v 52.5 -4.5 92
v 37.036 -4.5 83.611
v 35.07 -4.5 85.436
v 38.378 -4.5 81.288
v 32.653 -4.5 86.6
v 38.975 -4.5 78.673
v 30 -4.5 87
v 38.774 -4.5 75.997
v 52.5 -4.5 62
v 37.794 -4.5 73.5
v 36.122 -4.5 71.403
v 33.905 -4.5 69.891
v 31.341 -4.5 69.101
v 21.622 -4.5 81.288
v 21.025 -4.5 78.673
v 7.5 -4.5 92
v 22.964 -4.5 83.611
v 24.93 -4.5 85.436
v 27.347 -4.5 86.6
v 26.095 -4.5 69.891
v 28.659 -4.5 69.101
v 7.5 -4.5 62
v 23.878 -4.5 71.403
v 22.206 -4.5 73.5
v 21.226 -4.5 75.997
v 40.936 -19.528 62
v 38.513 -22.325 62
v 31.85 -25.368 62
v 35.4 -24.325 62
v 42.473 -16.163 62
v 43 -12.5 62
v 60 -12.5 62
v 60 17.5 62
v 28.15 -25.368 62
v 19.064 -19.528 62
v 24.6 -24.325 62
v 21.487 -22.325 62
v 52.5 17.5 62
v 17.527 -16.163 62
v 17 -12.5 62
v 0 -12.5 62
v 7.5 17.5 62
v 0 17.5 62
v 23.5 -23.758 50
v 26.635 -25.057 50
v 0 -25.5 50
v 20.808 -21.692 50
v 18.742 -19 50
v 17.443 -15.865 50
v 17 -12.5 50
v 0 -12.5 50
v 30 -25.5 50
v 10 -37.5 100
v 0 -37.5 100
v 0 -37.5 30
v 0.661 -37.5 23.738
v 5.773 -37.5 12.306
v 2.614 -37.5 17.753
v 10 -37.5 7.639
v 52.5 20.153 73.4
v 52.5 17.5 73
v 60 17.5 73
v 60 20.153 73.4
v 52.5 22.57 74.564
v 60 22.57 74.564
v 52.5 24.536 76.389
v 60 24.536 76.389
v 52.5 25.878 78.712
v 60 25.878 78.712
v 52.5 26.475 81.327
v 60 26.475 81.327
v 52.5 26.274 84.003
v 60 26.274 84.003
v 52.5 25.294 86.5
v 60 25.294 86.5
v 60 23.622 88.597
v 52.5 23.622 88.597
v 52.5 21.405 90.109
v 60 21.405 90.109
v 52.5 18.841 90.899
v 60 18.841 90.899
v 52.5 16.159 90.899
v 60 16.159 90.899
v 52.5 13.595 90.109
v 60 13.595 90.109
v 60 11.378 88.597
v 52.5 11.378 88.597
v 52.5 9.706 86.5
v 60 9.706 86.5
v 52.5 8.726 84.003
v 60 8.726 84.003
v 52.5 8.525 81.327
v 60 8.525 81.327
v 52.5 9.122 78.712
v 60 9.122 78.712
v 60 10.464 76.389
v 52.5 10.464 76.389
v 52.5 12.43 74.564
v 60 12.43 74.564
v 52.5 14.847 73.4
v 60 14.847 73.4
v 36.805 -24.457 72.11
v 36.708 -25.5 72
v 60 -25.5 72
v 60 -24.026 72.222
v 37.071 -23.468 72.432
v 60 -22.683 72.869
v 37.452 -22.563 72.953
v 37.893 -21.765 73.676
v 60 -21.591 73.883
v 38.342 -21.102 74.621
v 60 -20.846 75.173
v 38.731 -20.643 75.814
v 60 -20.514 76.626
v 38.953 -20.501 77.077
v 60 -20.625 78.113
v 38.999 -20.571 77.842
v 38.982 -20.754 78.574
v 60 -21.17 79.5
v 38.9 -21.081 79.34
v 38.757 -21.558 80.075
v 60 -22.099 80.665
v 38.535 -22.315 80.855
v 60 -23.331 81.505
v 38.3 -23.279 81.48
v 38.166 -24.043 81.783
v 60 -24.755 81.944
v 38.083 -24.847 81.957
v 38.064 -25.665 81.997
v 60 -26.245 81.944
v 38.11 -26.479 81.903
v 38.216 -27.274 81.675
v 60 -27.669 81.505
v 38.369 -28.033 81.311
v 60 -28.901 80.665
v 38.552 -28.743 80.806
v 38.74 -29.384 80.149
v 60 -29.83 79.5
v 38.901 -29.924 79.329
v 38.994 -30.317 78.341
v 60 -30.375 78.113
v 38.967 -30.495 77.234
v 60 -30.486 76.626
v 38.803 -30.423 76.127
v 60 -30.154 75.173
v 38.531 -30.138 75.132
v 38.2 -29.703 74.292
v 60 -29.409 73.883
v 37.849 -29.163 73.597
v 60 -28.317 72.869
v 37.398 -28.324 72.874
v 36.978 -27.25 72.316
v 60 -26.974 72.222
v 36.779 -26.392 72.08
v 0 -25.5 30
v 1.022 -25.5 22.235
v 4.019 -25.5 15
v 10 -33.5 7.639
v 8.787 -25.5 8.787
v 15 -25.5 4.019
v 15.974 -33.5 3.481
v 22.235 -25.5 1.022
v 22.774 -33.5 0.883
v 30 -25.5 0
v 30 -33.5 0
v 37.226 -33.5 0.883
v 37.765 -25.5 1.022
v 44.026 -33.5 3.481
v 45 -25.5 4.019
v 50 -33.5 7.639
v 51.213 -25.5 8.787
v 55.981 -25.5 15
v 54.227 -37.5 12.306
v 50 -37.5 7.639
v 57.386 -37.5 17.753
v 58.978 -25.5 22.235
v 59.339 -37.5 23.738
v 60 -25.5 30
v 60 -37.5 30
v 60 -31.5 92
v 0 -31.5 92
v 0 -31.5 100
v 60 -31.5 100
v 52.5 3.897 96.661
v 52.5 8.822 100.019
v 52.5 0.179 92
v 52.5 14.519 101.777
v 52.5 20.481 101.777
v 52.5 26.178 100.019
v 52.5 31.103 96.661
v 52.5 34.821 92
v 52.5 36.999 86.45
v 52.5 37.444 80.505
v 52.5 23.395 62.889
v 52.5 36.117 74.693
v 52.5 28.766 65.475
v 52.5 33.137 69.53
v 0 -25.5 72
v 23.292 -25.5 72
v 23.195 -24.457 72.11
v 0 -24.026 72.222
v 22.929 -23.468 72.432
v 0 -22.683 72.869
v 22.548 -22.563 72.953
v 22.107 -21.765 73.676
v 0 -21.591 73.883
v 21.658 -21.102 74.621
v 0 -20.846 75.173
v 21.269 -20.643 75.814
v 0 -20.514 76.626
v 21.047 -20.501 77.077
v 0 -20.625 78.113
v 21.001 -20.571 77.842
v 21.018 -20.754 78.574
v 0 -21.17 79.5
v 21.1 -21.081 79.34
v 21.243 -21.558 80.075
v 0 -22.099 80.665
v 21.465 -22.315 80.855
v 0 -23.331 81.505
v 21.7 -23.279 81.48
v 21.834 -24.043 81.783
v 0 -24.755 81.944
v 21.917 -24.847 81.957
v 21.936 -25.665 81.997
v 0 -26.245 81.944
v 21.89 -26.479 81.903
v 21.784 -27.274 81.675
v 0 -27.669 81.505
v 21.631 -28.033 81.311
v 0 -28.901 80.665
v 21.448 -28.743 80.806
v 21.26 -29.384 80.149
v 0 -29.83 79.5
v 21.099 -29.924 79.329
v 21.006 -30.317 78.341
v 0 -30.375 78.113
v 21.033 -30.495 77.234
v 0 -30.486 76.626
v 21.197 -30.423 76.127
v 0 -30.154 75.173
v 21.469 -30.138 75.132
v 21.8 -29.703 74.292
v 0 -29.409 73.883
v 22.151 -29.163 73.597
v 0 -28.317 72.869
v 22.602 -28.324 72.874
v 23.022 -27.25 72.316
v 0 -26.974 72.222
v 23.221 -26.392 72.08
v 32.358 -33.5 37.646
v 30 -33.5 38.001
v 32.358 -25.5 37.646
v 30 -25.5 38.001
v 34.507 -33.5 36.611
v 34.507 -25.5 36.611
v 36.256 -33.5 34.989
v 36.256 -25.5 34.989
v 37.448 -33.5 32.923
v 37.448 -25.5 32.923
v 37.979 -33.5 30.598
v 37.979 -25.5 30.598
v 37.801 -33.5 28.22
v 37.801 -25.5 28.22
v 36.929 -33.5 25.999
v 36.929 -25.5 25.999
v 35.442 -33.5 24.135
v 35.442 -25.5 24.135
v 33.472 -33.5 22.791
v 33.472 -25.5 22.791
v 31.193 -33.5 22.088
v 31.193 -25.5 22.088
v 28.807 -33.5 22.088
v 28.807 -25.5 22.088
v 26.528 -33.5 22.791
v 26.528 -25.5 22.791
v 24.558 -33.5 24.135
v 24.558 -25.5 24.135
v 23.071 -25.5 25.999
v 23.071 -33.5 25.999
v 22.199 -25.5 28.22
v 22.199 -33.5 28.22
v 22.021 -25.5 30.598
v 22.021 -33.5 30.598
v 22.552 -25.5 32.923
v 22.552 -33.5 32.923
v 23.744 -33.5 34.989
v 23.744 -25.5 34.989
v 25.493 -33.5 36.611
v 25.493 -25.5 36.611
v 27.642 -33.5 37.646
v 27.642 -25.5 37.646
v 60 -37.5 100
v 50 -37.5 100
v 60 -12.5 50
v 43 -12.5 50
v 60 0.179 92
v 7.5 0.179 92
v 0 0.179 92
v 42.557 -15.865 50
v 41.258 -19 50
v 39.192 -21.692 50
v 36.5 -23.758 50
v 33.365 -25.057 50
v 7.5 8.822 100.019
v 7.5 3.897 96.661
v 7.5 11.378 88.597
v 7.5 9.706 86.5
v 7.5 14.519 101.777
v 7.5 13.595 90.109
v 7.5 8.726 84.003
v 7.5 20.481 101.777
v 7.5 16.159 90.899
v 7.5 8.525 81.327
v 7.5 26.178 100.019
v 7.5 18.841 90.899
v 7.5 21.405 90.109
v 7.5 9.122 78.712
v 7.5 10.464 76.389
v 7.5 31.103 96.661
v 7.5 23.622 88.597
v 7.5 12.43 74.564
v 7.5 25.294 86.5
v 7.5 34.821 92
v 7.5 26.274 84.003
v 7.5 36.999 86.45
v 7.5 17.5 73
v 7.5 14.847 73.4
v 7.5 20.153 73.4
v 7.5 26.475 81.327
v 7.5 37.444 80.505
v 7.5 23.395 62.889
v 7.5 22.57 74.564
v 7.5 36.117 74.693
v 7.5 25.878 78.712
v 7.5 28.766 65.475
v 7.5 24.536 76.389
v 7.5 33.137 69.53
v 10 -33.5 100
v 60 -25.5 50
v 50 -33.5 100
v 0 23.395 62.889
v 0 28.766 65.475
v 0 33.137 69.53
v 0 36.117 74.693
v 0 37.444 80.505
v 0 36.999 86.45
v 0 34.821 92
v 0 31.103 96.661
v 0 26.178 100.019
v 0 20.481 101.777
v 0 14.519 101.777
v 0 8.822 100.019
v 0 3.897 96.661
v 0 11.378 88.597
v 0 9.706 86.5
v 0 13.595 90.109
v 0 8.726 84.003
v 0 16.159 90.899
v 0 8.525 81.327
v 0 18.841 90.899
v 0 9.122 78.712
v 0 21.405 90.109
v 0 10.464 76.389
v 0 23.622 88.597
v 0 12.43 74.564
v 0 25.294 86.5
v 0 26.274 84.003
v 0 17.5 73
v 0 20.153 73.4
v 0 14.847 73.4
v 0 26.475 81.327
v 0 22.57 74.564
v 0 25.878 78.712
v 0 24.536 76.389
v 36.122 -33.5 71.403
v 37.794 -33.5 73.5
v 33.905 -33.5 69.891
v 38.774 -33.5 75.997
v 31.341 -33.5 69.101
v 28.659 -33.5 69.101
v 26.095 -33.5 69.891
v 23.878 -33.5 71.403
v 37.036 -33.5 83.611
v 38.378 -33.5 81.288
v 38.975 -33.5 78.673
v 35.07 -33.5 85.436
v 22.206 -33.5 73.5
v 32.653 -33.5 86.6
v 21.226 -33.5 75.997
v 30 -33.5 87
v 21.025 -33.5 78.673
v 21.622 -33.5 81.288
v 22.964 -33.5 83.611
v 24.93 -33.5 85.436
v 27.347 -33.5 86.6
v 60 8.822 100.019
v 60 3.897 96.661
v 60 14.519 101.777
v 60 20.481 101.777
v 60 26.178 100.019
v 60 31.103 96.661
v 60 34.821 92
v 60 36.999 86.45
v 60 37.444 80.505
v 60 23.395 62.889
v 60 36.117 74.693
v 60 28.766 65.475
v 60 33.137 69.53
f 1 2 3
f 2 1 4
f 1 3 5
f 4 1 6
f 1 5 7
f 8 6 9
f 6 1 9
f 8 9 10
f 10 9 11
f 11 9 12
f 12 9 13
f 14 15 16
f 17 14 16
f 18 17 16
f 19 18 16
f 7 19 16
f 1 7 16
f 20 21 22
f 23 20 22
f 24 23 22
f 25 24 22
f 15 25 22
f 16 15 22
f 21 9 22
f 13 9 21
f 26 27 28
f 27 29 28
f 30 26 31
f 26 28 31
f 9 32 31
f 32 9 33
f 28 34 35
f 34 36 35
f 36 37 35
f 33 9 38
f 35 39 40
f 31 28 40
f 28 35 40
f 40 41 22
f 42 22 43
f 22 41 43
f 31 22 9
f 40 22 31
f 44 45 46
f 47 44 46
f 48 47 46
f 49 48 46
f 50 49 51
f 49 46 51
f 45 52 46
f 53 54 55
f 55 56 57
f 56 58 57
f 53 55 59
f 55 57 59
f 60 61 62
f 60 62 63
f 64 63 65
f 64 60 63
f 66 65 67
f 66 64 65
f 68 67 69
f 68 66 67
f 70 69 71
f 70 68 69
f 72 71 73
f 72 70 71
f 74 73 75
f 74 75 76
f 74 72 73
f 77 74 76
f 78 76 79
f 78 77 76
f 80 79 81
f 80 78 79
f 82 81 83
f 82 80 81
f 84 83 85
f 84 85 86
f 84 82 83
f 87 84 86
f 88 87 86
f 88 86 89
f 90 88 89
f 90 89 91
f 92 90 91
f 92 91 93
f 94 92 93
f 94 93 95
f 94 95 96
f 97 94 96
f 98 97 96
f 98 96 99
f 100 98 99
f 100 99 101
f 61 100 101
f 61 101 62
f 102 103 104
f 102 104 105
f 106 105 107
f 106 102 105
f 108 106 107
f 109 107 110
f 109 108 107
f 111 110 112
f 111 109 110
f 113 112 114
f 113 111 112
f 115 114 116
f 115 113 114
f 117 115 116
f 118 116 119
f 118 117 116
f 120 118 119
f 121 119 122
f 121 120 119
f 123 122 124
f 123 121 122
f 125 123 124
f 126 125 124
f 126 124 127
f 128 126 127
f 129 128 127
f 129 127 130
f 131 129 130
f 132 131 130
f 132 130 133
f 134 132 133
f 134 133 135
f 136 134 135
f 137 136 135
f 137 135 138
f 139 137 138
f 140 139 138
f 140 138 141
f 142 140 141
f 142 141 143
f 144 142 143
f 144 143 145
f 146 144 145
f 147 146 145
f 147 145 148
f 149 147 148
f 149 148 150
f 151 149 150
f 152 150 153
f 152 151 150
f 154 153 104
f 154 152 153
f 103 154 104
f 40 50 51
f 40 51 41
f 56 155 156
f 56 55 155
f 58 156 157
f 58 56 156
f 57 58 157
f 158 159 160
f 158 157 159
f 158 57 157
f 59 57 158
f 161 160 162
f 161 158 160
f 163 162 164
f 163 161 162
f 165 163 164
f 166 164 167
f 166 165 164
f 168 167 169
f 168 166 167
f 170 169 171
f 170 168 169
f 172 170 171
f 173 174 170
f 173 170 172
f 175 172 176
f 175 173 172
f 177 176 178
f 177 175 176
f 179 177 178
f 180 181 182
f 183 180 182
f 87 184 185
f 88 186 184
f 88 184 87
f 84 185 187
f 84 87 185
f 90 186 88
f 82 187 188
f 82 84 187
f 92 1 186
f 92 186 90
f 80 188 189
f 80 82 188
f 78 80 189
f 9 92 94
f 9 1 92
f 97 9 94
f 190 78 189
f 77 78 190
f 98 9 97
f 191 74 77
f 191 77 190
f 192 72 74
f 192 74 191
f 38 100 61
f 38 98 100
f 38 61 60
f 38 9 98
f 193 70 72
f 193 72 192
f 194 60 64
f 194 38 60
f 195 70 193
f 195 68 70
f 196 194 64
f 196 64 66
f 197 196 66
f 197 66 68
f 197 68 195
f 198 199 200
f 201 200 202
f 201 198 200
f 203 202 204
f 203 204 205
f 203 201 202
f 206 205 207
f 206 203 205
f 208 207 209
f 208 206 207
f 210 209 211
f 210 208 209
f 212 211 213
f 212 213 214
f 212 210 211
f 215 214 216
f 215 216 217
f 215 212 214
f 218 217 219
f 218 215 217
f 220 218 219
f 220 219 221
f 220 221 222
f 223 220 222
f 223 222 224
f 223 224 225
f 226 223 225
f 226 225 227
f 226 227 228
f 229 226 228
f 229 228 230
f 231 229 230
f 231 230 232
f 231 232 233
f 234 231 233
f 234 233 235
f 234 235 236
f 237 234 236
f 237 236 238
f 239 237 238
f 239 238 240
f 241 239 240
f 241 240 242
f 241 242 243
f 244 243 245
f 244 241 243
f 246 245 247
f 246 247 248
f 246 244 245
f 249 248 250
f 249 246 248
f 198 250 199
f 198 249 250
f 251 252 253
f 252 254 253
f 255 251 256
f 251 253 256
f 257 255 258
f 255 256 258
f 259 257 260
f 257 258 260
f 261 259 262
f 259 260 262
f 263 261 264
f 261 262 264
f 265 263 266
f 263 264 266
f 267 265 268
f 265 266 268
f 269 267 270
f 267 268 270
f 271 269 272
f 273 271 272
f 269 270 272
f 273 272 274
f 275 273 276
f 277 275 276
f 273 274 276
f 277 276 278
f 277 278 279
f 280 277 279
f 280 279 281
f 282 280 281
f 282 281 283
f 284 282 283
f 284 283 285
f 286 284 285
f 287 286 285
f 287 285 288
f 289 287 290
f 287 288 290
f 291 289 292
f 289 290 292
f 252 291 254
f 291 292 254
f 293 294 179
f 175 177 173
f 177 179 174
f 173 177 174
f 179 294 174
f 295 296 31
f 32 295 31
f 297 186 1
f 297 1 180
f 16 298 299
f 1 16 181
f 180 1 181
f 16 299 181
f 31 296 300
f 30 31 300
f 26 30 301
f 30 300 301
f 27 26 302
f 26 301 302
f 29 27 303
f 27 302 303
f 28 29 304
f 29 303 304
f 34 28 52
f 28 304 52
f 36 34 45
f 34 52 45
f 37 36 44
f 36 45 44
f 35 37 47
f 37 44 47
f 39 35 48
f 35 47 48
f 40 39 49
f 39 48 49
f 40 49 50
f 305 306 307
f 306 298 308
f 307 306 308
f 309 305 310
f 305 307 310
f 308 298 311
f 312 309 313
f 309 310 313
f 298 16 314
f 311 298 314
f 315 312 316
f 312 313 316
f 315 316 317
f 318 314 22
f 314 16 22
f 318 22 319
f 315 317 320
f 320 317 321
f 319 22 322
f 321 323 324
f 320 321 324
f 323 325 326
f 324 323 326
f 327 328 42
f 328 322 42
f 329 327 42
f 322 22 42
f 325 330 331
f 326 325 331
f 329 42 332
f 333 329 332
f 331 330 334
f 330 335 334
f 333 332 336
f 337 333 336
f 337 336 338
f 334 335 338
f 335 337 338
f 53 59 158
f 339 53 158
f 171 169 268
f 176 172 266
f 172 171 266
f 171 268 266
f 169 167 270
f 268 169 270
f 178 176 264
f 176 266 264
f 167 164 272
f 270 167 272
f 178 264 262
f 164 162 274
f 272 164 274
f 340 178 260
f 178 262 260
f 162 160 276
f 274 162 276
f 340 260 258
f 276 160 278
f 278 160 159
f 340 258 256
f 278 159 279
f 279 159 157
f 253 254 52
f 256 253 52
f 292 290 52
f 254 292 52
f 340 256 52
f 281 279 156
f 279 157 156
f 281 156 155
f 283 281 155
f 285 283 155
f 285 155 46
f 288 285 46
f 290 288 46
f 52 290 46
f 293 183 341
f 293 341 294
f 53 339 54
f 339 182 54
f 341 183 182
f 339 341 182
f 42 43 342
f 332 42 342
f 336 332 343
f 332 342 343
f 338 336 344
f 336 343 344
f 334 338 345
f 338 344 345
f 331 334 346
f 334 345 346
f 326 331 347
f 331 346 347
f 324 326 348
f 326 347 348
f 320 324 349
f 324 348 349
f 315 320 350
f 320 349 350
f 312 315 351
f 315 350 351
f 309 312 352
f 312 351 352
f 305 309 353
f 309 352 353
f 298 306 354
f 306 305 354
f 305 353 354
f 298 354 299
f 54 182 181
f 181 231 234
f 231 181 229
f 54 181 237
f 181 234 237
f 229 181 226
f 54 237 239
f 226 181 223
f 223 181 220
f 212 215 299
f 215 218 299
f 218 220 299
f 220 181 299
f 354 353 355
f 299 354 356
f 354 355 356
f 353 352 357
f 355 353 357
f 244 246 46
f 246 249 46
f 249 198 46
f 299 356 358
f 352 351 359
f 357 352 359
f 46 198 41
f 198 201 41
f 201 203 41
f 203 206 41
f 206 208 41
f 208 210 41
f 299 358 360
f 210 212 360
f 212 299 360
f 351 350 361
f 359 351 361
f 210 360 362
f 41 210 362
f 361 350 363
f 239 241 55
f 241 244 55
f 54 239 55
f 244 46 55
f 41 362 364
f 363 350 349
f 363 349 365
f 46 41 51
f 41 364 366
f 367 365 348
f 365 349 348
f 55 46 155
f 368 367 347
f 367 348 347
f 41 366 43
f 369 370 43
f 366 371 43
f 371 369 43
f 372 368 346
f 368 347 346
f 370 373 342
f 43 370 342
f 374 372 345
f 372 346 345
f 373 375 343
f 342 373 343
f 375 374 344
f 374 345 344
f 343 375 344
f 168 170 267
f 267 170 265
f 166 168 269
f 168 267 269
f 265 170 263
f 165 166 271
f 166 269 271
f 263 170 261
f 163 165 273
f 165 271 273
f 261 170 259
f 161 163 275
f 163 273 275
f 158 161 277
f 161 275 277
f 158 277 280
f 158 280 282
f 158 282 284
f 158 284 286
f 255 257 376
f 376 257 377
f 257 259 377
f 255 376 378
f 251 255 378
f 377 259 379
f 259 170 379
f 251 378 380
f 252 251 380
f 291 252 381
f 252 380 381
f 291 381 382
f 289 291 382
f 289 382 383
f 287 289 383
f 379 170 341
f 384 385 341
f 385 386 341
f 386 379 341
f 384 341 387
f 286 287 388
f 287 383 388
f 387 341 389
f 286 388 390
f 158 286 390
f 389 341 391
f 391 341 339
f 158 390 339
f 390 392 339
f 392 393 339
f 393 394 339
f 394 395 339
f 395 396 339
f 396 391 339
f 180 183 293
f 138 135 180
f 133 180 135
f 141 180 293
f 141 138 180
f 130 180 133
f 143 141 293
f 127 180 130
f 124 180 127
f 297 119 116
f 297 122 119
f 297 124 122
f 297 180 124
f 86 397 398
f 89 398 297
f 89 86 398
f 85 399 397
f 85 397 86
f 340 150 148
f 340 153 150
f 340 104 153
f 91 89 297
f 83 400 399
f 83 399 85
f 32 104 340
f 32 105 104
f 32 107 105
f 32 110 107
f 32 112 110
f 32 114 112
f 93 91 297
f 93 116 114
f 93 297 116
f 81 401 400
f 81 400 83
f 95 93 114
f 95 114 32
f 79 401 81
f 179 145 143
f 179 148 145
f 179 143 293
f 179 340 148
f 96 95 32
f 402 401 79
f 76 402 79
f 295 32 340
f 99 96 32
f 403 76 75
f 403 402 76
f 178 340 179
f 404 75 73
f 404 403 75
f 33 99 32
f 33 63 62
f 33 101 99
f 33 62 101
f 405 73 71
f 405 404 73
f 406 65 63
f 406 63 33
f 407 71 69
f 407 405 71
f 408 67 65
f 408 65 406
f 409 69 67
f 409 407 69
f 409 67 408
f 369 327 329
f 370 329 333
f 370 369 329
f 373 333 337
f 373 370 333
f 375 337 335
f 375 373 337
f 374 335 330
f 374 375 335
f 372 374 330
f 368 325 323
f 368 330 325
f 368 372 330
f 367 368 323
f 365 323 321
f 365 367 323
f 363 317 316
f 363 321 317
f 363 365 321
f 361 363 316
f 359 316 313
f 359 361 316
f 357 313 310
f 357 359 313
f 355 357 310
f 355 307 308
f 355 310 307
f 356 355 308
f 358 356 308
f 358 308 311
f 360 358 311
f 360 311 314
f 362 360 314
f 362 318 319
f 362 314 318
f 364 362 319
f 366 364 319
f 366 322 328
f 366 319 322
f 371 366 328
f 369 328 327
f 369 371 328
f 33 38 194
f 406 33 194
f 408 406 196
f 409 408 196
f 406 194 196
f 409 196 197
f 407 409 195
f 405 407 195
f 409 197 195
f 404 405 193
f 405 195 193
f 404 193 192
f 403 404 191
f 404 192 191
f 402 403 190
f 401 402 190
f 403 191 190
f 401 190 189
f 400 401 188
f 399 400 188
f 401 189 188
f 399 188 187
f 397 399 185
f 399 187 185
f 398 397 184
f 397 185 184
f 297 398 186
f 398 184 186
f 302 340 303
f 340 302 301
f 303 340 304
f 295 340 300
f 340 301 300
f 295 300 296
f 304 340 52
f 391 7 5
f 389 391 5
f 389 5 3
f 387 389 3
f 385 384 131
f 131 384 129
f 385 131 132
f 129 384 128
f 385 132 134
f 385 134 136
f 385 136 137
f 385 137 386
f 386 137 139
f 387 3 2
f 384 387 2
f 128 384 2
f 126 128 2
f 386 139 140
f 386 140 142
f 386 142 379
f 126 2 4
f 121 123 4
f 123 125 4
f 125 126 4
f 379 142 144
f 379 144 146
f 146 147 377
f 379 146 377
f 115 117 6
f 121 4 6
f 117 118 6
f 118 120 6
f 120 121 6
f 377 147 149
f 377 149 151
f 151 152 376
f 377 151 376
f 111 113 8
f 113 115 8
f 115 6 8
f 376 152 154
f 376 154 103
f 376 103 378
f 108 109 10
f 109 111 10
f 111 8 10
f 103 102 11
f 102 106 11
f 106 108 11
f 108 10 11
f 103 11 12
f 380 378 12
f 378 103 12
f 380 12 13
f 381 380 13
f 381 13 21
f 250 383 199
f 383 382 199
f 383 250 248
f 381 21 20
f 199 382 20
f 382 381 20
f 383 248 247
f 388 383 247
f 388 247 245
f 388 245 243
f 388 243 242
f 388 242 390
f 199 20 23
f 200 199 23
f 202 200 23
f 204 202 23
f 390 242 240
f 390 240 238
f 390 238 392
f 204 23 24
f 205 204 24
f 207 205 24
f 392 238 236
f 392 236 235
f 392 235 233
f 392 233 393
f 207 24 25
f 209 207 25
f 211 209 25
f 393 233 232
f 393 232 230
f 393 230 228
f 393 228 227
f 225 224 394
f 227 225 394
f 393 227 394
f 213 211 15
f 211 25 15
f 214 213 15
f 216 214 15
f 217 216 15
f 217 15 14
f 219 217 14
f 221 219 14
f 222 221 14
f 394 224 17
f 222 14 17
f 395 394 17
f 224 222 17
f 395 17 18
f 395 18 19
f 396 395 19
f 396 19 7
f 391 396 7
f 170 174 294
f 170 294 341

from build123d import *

# Parameters (mm, degrees)
ESQUISSE2_R             = 9
ESQUISSE2_R_2           = 5
BOSS_EXTRU_1_DEPTH      = 60
ESQUISSE3_W             = 40
ESQUISSE3_H             = 4
ESQUISSE3_W_2           = 45
ESQUISSE3_H_2           = 42
ENL_V_MAT_EXTRU_1_DEPTH = 85
CONG_1_RADIUS           = 30
CONG_1_LENGTH           = 12
ESQUISSE4_R             = 9
ESQUISSE4_R_2           = 8.001463265
ENL_V_MAT_EXTRU_2_DEPTH = 85
ESQUISSE5_R             = 13
ENL_V_MAT_EXTRU_3_DEPTH = 12


with BuildPart() as part:
    # Esquisse2 → Boss.-Extru.1 (new body)
    with BuildSketch(Plane(origin=(0, 0, 0), x_dir=(0, 0, -1), z_dir=(1, 0, 0))):
        with BuildLine():
            Line((0, -25.5), (-50, -25.5))
            Line((-50, -25.5), (-50, -12.5))
            Line((-50, -12.5), (-62, -12.5))
            Line((-62, -12.5), (-62, 17.5))
            ThreePointArc((-62, 17.5), (-92, 34.820508076), (-92, 0.179491924))
            Line((-92, 0.179491924), (-92, -31.5))
            Line((-92, -31.5), (-100, -31.5))
            Line((-100, -31.5), (-100, -37.5))
            Line((-100, -37.5), (0, -37.5))
            Line((0, -37.5), (0, -25.5))
        make_face()
        with Locations((-82, 17.5)):
            Circle(ESQUISSE2_R, mode=Mode.SUBTRACT)
        with Locations((-77, -25.5)):
            Circle(ESQUISSE2_R_2, mode=Mode.SUBTRACT)
    extrude(amount=BOSS_EXTRU_1_DEPTH)

    # Esquisse3 → Enlèv. mat.-Extru.1 (cut, symmetric)
    with BuildSketch(Plane(origin=(0, 0, 62), x_dir=(-1, 0, 0), z_dir=(0, 0, -1))):
        with Locations((-30, -35.5)):
            Rectangle(ESQUISSE3_W, ESQUISSE3_H)
        with Locations((-30, 16.5)):
            Rectangle(ESQUISSE3_W_2, ESQUISSE3_H_2)
    extrude(amount=ENL_V_MAT_EXTRU_1_DEPTH, both=True, mode=Mode.SUBTRACT)

    # Congé1: full round fillet: the end face becomes a half cylinder, R = half its width
    cong_1_face = Plane((30, -31.5, 0), x_dir=(0, -1, 0), z_dir=(0, 0, -1))  # on the end face: x along it, z out of the body
    cong_1_slab = cong_1_face.offset(-CONG_1_RADIUS / 2) * Box(CONG_1_LENGTH, 2 * CONG_1_RADIUS, CONG_1_RADIUS, mode=Mode.PRIVATE)  # the body's end, R deep
    cong_1_round = Plane((30, -31.5, 30), x_dir=(0, 0, -1), z_dir=(0, -1, 0)) * Cylinder(CONG_1_RADIUS, CONG_1_LENGTH, mode=Mode.PRIVATE)  # its axis R under the face
    add(cong_1_slab - cong_1_round, mode=Mode.SUBTRACT)

    # Esquisse4 → Enlèv. mat.-Extru.2 (cut, symmetric)
    with BuildSketch(Plane(origin=(0, -4.5, 0), x_dir=(1, 0, 0), z_dir=(0, 1, 0))):
        with Locations(Location((30, -78, 0), (0, 0, 270))):
            Circle(ESQUISSE4_R)
        with Locations(Location((30, -30, 0), (0, 0, 270))):
            Circle(ESQUISSE4_R_2)
    extrude(amount=ENL_V_MAT_EXTRU_2_DEPTH, both=True, mode=Mode.SUBTRACT)

    # Esquisse5 → Enlèv. mat.-Extru.3 (cut)
    with BuildSketch(Plane(origin=(0, 0, 50), x_dir=(-1, 0, 0), z_dir=(0, 0, -1))):
        with Locations((-30, -12.5)):
            Circle(ESQUISSE5_R)
    extrude(amount=-ENL_V_MAT_EXTRU_3_DEPTH, mode=Mode.SUBTRACT)


solid = part.part
